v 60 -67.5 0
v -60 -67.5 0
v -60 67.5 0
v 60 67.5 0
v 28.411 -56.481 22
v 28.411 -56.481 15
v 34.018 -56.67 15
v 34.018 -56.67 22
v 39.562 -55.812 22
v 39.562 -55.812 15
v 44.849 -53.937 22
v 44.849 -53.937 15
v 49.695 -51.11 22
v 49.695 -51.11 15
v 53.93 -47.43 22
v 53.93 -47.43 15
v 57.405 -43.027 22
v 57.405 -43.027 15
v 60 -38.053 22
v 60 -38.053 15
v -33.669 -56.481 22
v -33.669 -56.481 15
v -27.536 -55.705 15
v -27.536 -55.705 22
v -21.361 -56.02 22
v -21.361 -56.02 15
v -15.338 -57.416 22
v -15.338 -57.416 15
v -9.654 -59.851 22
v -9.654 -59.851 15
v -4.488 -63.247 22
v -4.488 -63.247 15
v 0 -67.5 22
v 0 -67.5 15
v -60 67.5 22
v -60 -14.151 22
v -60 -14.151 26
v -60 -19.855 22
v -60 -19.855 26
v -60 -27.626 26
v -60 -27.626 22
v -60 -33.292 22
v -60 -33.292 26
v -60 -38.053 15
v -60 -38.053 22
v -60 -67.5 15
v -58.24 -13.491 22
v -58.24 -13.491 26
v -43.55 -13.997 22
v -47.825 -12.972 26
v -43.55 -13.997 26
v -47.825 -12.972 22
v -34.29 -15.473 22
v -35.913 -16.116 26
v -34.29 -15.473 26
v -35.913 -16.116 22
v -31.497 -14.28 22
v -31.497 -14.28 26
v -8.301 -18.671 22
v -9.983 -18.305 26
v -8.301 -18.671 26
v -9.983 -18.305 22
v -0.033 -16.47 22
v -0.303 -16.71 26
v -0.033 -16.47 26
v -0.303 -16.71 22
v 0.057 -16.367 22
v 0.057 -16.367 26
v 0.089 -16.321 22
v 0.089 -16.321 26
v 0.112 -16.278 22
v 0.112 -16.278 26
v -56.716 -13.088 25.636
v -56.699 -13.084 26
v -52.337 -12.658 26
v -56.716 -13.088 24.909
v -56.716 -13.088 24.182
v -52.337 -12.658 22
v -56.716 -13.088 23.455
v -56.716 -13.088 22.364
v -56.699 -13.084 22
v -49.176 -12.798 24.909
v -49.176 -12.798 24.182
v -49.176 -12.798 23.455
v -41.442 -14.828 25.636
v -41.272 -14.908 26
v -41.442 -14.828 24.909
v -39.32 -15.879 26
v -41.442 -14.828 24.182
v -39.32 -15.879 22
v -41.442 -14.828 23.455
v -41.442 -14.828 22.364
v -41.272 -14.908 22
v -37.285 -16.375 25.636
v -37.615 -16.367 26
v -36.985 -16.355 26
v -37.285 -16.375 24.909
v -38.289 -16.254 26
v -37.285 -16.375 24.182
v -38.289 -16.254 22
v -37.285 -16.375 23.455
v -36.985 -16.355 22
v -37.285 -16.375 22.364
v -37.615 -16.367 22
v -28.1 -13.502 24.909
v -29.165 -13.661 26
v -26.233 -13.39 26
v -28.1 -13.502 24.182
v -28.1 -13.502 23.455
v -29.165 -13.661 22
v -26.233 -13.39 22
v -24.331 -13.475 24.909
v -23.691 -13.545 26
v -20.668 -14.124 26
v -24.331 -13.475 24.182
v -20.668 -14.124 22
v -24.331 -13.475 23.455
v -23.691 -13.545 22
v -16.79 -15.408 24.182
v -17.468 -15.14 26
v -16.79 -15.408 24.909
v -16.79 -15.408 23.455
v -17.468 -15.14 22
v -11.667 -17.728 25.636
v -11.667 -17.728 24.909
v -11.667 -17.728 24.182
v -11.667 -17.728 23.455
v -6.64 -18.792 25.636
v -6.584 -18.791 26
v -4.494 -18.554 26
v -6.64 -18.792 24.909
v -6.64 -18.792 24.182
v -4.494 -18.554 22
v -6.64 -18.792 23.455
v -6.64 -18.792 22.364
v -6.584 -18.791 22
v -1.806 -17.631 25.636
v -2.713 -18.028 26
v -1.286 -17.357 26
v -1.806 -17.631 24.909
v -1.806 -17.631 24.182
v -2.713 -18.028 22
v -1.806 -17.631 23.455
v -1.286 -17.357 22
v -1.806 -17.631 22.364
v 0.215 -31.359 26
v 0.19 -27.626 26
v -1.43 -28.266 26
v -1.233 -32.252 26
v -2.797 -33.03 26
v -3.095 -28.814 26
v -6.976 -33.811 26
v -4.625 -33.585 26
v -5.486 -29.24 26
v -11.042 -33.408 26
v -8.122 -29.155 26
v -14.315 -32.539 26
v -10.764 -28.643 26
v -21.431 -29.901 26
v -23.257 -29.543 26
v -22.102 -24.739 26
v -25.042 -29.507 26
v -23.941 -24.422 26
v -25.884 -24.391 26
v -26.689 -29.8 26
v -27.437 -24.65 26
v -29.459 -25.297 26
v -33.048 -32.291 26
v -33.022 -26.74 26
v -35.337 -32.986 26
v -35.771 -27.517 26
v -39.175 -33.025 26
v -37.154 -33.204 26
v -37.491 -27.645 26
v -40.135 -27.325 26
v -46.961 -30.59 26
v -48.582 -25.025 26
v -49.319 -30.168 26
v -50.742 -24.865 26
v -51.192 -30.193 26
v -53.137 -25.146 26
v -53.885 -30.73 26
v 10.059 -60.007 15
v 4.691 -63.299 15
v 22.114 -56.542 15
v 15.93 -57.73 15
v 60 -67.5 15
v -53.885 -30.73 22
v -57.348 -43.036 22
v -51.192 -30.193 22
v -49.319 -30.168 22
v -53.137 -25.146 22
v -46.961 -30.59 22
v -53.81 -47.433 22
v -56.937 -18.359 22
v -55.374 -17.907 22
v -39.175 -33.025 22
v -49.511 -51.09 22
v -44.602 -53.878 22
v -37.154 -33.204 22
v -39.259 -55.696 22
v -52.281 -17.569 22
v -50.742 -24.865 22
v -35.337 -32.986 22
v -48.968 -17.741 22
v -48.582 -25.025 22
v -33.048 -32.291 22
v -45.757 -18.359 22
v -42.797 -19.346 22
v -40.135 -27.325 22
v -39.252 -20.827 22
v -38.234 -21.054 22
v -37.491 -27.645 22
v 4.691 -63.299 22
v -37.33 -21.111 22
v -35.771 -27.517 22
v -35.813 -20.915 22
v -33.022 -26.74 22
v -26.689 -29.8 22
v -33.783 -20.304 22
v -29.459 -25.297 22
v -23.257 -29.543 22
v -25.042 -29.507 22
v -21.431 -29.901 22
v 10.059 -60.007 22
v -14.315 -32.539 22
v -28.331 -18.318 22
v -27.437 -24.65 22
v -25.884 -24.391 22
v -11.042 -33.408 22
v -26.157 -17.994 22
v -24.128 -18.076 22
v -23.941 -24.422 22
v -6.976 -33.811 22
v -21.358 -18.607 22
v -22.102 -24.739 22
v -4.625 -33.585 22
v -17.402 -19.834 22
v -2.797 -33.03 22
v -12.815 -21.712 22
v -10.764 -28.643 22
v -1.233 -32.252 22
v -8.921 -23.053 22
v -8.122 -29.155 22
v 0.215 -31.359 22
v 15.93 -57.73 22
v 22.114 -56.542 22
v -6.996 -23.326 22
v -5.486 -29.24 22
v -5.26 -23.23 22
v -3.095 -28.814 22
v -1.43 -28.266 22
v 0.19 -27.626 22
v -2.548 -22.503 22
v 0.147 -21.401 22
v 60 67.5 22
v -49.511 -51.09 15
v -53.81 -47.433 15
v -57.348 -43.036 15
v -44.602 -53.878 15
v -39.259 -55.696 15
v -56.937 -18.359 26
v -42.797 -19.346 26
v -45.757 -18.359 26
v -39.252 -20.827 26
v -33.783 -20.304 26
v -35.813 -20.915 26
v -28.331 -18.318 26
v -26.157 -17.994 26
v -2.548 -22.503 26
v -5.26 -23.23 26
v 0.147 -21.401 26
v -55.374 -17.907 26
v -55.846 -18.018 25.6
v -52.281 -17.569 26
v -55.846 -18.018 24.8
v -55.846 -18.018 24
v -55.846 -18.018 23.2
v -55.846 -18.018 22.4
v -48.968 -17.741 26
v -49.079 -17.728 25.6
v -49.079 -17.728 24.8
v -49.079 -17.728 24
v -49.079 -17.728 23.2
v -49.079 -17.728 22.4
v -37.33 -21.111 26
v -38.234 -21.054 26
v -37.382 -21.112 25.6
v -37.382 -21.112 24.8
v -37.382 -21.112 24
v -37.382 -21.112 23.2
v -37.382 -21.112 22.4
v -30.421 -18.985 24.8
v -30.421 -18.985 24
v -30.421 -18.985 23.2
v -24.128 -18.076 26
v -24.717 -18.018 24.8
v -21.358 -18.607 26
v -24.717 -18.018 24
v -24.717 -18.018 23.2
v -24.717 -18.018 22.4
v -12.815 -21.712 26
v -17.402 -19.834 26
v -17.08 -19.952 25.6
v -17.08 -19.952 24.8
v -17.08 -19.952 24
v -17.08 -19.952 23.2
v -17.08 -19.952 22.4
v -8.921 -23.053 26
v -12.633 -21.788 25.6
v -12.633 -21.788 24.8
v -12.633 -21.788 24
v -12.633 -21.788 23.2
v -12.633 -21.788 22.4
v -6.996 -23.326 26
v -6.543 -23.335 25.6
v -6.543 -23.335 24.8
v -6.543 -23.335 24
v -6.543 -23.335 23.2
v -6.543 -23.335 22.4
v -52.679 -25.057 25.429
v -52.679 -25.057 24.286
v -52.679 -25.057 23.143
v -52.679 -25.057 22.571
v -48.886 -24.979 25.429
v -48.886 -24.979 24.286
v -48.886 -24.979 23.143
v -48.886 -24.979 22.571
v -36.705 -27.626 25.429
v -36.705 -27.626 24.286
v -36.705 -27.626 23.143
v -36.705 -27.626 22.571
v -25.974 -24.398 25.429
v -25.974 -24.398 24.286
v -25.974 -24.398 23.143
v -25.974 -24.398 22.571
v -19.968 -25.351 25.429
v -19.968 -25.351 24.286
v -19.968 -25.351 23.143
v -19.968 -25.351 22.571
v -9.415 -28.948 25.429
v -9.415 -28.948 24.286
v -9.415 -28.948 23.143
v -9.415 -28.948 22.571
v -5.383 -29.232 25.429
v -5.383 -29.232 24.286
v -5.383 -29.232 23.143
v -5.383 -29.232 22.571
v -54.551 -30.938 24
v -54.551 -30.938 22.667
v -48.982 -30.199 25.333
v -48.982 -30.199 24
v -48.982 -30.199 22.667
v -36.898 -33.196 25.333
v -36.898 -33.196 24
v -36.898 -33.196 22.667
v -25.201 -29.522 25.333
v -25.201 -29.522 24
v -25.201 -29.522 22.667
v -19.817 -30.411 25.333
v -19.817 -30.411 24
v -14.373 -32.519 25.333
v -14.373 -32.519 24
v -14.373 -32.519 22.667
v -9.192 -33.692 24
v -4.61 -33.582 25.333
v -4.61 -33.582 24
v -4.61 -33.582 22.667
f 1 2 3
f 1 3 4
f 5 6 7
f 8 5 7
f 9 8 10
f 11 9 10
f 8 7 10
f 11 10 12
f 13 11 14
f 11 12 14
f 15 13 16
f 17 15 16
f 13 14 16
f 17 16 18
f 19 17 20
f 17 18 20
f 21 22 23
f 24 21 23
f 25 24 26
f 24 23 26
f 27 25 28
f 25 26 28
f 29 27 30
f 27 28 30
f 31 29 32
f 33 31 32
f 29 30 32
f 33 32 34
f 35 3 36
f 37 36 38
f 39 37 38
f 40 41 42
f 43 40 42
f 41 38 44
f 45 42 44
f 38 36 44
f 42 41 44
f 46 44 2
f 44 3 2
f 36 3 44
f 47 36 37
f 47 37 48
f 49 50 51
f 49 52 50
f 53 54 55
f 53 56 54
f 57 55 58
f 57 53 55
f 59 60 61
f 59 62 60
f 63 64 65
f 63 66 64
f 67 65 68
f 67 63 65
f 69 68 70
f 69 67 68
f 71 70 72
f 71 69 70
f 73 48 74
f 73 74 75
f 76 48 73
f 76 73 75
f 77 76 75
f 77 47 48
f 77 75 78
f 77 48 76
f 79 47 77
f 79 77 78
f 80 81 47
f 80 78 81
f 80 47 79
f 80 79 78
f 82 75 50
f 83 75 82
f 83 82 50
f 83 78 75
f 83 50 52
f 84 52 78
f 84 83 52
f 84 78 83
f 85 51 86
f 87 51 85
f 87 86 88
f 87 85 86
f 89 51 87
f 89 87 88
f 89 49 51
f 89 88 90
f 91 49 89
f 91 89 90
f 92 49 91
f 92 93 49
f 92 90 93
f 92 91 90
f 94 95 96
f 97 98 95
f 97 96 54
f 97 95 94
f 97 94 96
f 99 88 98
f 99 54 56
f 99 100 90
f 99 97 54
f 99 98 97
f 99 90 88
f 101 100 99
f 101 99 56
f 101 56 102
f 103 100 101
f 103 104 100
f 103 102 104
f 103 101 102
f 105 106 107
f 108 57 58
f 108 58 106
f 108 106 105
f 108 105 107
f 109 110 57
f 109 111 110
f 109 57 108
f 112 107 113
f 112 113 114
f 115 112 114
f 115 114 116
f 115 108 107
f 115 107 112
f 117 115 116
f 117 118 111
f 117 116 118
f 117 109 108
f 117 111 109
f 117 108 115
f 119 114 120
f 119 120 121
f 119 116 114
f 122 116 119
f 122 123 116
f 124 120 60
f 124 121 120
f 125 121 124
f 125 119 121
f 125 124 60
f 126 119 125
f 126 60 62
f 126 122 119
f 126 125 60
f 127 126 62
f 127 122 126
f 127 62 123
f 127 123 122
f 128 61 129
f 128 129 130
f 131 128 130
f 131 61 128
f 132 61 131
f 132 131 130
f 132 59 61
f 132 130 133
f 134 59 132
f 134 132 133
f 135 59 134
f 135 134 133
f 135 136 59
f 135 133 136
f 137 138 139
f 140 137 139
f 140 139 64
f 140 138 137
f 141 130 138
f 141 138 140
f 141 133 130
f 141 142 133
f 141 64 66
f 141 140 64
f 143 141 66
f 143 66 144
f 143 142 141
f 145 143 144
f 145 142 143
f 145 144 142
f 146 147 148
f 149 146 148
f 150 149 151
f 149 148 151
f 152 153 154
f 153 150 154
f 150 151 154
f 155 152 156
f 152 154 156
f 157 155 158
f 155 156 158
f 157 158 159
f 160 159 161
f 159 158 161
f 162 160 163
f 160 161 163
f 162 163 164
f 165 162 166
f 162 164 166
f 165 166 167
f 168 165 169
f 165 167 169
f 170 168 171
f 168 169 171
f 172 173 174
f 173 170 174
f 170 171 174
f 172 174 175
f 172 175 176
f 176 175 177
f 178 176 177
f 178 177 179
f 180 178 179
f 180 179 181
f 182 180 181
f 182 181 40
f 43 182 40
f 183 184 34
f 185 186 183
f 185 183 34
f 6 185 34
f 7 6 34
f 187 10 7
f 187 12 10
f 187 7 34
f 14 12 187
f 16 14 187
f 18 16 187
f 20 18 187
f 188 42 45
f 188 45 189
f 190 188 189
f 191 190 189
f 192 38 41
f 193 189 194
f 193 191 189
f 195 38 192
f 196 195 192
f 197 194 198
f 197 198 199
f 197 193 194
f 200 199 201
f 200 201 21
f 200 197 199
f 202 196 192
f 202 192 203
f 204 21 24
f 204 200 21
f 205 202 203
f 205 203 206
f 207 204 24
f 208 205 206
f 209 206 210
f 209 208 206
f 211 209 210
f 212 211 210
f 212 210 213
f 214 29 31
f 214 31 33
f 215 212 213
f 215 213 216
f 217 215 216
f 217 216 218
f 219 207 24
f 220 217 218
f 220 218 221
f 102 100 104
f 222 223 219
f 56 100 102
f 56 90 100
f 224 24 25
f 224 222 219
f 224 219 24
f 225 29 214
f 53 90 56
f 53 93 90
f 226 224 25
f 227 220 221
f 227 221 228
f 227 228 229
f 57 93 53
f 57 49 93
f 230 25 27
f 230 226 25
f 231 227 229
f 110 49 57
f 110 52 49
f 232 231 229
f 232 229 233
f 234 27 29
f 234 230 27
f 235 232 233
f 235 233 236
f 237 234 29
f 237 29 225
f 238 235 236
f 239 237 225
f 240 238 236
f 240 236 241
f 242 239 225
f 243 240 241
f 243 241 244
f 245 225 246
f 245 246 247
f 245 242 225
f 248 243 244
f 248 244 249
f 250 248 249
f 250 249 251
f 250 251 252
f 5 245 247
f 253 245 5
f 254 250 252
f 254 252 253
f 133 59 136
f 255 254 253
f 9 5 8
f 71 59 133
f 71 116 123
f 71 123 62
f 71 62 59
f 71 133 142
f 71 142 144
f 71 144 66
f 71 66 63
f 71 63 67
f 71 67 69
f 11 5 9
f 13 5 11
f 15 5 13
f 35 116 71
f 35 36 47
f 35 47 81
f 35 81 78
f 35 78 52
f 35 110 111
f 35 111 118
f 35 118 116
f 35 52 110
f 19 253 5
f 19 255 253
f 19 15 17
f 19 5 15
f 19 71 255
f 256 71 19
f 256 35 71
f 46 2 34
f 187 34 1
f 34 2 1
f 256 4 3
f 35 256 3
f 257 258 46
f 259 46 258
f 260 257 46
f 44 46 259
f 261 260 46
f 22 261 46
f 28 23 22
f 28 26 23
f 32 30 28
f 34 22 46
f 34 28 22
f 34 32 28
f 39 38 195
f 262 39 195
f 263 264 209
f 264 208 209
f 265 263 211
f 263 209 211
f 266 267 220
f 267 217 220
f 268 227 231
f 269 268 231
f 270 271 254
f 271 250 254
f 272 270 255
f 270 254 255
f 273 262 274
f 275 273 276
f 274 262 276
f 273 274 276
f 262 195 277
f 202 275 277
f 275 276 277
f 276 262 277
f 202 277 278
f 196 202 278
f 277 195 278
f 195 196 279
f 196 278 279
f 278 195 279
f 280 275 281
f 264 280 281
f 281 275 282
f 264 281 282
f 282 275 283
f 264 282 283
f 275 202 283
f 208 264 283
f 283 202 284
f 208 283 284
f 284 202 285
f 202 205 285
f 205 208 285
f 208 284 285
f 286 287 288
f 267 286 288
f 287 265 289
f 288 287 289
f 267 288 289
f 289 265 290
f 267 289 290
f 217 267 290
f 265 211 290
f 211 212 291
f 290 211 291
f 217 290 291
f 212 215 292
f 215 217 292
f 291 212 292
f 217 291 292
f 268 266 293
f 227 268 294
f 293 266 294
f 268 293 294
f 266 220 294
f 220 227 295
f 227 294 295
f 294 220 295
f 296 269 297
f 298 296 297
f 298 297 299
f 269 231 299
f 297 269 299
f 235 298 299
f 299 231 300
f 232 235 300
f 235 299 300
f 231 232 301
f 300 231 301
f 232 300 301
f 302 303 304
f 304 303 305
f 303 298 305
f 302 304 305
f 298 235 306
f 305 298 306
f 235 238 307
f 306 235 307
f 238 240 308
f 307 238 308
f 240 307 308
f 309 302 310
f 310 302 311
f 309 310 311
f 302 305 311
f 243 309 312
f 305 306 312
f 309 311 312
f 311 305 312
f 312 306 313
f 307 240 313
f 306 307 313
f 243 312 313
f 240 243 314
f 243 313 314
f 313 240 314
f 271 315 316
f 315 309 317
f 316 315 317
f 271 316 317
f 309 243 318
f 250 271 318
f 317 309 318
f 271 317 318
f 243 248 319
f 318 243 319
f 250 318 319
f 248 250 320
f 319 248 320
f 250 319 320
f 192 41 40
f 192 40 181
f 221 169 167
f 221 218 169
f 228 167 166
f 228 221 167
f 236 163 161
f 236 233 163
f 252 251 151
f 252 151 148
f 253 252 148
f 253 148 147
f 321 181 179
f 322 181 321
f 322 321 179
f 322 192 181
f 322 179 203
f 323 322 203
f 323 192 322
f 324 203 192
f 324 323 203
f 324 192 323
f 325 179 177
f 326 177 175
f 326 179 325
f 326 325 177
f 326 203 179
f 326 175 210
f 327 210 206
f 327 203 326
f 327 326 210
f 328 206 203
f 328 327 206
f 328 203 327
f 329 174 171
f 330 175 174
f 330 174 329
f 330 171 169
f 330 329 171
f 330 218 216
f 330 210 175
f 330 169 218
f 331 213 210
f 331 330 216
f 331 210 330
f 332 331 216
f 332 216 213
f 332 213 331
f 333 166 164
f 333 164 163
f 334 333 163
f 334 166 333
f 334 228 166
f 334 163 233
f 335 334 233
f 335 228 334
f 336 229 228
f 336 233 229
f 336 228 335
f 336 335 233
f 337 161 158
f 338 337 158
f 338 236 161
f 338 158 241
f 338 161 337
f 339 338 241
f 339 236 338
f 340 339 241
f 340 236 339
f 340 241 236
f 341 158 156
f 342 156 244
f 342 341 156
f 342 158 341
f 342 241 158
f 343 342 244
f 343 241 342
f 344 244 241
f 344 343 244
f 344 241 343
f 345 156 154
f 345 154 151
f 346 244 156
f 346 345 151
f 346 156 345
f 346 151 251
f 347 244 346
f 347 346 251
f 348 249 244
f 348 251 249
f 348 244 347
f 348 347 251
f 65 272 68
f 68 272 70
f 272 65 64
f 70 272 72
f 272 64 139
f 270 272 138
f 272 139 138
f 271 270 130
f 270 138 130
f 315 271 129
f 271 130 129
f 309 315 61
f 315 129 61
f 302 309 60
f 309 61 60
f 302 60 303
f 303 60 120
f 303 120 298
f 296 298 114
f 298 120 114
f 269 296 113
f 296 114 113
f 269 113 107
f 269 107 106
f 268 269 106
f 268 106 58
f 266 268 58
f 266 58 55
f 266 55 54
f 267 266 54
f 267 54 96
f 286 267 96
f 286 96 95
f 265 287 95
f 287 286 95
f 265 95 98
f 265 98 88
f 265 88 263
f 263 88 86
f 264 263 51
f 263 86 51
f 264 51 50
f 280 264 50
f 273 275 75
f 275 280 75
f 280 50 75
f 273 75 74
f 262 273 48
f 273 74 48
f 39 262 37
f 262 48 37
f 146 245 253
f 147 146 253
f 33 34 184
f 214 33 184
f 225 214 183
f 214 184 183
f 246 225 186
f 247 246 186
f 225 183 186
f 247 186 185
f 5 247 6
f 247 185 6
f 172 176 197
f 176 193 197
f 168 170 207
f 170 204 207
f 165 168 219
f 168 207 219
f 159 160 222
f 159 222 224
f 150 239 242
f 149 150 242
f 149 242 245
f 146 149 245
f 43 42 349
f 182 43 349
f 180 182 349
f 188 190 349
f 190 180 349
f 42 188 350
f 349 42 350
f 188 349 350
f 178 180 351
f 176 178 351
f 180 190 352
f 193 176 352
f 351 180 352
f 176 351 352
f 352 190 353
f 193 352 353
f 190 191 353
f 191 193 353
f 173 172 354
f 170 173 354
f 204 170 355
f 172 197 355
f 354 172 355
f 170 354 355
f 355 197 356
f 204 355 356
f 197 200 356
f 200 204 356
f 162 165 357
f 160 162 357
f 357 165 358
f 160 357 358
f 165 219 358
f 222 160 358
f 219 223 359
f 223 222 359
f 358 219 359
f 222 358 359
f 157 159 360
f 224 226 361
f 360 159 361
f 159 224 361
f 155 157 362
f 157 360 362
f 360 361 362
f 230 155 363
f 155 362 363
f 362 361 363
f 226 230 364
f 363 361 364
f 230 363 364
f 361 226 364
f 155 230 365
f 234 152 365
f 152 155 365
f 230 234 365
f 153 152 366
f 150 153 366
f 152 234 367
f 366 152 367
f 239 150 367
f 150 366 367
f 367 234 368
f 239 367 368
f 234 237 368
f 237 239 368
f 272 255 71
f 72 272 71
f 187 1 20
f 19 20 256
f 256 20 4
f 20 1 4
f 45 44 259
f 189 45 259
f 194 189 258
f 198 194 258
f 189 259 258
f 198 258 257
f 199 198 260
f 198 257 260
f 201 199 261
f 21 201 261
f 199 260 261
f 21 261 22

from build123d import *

# Parameters (mm, degrees)
F0_W     = 60
F0_H     = 67.5
F1_DEPTH = 15
F5_DEPTH = 7
F7_DEPTH = 4


with BuildPart() as f1:
    # F0 (on Top) → F1 (new body)
    with BuildSketch(Plane.XY):
        with Locations((-30, 33.75)):
            Rectangle(F0_W, F0_H)
        Polygon((60, 67.5), (0, 67.5), (0, 0), (5.9781013988, 0), (60, 0), align=None)
        with Locations((-30, -33.75)):
            Rectangle(F0_W, F0_H)
        Polygon((5.9781013988, 0), (0, 0), (0, -67.5), (60, -67.5), (60, 0), align=None)
    extrude(amount=F1_DEPTH)

    # F4 (on face) → F5 (join)
    with BuildSketch(Plane.XY.offset(15)):
        with BuildLine():
            Line((-60, 0), (-60, -38.0529202521))
            ThreePointArc((-60, -38.0529202521), (-49.5105953574, -51.0904314292), (-33.6693982898, -56.4812368343))
            ThreePointArc((-33.6693982898, -56.4812368343), (-15.3376274344, -57.4161028449), (0, -67.5))
            ThreePointArc((0, -67.5), (12.9433258402, -58.7363497884), (28.410895604, -56.4812368343))
            ThreePointArc((28.410895604, -56.4812368343), (47.3381804243, -52.6370871063), (60, -38.0529202521))
            Line((60, -38.0529202521), (60, 67.5))
            Line((60, 67.5), (-60, 67.5))
            Line((-60, 67.5), (-60, 0))
        make_face()
    extrude(amount=F5_DEPTH)

    # F6 (on face) → F7 (join)
    with BuildSketch(Plane.XY.offset(22)):
        with BuildLine():
            add(Edge.make_bspline(
                [(-60, -14.1512239352), (-59.0293889919, -13.7585961079), (-56.6236997139, -12.7854559454), (-49.0504631043, -12.3499323054), (-41.4676376213, -14.4143905876), (-37.310563853, -17.3961414407), (-31.6113048526, -13.7340453951), (-24.3327976689, -12.9655279158), (-16.730226682, -15.1518072312), (-11.848805959, -17.9023620476), (-6.6941574417, -19.2385563279), (-2.0295442031, -18.0148753376), (-0.0189397587, -16.5628165681), (0.1118455984, -16.2781241236)],
                knots=[0, 0, 0, 0, 0.0705560873, 0.1748754354, 0.2822587754, 0.3622366871, 0.454972104, 0.5582662803, 0.6642203819, 0.7542834332, 0.8403652981, 0.925033899, 0.9832160145, 0.9832160145, 0.9832160145, 0.9832160145], degree=3))
            Line((-60, -14.1512239352), (-60, -19.8548957705))
            add(Edge.make_bspline(
                [(-60, -19.8548957705), (-58.7257888093, -19.1436585072), (-55.8955547979, -17.5638827938), (-48.9702862444, -17.3858195386), (-42.4680056618, -19.1850661251), (-37.463020039, -22.1911615113), (-30.3087693341, -18.677386885), (-24.871896529, -17.4062862995), (-16.9093310744, -19.8677835147), (-12.7943307223, -21.7909091619), (-6.3861561614, -24.228006265), (-2.0676772483, -22.3592450119), (0.1470434485, -21.4008556559)],
                knots=[0, 0, 0, 0, 0.0855559678, 0.190033969, 0.2947188809, 0.3878397063, 0.4961411128, 0.5926967688, 0.7053736836, 0.7934295061, 0.8940608586, 1, 1, 1, 1], degree=3))
            Line((0.1470434485, -21.4008556559), (0.1118455984, -16.2781241236))
        make_face()
        with BuildLine():
            add(Edge.make_bspline(
                [(-60, -27.6262178335), (-58.6908579139, -27.0610454374), (-55.7423438806, -25.7881364393), (-48.6094061642, -23.7011458379), (-36.3948711424, -30.1574496981), (-26.1879734271, -21.9651117607), (-14.2133970996, -28.0543249168), (-5.5258287766, -29.9499942904), (-1.5805656805, -28.3459920046), (0.1898173795, -27.6262178335)],
                knots=[0, 0, 0, 0, 0.1030829205, 0.2321684107, 0.4040915702, 0.5670970962, 0.7386692977, 0.882731408, 1, 1, 1, 1], degree=3))
            Line((-60, -27.6262178335), (-60, -33.2923606038))
            add(Edge.make_bspline(
                [(-60, -33.2923606038), (-56.3803265128, -31.5433703048), (-48.9851936137, -27.9701154943), (-36.844872956, -36.1289431011), (-25.2372817337, -26.9445755845), (-14.8016717458, -33.2381042089), (-4.5983556928, -34.4314814953), (-1.2173570397, -32.2734966719), (0.2154648118, -31.358971667)],
                knots=[0, 0, 0, 0, 0.1761592769, 0.3599002143, 0.5422376138, 0.7167772716, 0.879974009, 1, 1, 1, 1], degree=3))
            Line((0.2154648118, -31.358971667), (0.1898173795, -27.6262178335))
        make_face()
    extrude(amount=F7_DEPTH)


solid = f1.part
